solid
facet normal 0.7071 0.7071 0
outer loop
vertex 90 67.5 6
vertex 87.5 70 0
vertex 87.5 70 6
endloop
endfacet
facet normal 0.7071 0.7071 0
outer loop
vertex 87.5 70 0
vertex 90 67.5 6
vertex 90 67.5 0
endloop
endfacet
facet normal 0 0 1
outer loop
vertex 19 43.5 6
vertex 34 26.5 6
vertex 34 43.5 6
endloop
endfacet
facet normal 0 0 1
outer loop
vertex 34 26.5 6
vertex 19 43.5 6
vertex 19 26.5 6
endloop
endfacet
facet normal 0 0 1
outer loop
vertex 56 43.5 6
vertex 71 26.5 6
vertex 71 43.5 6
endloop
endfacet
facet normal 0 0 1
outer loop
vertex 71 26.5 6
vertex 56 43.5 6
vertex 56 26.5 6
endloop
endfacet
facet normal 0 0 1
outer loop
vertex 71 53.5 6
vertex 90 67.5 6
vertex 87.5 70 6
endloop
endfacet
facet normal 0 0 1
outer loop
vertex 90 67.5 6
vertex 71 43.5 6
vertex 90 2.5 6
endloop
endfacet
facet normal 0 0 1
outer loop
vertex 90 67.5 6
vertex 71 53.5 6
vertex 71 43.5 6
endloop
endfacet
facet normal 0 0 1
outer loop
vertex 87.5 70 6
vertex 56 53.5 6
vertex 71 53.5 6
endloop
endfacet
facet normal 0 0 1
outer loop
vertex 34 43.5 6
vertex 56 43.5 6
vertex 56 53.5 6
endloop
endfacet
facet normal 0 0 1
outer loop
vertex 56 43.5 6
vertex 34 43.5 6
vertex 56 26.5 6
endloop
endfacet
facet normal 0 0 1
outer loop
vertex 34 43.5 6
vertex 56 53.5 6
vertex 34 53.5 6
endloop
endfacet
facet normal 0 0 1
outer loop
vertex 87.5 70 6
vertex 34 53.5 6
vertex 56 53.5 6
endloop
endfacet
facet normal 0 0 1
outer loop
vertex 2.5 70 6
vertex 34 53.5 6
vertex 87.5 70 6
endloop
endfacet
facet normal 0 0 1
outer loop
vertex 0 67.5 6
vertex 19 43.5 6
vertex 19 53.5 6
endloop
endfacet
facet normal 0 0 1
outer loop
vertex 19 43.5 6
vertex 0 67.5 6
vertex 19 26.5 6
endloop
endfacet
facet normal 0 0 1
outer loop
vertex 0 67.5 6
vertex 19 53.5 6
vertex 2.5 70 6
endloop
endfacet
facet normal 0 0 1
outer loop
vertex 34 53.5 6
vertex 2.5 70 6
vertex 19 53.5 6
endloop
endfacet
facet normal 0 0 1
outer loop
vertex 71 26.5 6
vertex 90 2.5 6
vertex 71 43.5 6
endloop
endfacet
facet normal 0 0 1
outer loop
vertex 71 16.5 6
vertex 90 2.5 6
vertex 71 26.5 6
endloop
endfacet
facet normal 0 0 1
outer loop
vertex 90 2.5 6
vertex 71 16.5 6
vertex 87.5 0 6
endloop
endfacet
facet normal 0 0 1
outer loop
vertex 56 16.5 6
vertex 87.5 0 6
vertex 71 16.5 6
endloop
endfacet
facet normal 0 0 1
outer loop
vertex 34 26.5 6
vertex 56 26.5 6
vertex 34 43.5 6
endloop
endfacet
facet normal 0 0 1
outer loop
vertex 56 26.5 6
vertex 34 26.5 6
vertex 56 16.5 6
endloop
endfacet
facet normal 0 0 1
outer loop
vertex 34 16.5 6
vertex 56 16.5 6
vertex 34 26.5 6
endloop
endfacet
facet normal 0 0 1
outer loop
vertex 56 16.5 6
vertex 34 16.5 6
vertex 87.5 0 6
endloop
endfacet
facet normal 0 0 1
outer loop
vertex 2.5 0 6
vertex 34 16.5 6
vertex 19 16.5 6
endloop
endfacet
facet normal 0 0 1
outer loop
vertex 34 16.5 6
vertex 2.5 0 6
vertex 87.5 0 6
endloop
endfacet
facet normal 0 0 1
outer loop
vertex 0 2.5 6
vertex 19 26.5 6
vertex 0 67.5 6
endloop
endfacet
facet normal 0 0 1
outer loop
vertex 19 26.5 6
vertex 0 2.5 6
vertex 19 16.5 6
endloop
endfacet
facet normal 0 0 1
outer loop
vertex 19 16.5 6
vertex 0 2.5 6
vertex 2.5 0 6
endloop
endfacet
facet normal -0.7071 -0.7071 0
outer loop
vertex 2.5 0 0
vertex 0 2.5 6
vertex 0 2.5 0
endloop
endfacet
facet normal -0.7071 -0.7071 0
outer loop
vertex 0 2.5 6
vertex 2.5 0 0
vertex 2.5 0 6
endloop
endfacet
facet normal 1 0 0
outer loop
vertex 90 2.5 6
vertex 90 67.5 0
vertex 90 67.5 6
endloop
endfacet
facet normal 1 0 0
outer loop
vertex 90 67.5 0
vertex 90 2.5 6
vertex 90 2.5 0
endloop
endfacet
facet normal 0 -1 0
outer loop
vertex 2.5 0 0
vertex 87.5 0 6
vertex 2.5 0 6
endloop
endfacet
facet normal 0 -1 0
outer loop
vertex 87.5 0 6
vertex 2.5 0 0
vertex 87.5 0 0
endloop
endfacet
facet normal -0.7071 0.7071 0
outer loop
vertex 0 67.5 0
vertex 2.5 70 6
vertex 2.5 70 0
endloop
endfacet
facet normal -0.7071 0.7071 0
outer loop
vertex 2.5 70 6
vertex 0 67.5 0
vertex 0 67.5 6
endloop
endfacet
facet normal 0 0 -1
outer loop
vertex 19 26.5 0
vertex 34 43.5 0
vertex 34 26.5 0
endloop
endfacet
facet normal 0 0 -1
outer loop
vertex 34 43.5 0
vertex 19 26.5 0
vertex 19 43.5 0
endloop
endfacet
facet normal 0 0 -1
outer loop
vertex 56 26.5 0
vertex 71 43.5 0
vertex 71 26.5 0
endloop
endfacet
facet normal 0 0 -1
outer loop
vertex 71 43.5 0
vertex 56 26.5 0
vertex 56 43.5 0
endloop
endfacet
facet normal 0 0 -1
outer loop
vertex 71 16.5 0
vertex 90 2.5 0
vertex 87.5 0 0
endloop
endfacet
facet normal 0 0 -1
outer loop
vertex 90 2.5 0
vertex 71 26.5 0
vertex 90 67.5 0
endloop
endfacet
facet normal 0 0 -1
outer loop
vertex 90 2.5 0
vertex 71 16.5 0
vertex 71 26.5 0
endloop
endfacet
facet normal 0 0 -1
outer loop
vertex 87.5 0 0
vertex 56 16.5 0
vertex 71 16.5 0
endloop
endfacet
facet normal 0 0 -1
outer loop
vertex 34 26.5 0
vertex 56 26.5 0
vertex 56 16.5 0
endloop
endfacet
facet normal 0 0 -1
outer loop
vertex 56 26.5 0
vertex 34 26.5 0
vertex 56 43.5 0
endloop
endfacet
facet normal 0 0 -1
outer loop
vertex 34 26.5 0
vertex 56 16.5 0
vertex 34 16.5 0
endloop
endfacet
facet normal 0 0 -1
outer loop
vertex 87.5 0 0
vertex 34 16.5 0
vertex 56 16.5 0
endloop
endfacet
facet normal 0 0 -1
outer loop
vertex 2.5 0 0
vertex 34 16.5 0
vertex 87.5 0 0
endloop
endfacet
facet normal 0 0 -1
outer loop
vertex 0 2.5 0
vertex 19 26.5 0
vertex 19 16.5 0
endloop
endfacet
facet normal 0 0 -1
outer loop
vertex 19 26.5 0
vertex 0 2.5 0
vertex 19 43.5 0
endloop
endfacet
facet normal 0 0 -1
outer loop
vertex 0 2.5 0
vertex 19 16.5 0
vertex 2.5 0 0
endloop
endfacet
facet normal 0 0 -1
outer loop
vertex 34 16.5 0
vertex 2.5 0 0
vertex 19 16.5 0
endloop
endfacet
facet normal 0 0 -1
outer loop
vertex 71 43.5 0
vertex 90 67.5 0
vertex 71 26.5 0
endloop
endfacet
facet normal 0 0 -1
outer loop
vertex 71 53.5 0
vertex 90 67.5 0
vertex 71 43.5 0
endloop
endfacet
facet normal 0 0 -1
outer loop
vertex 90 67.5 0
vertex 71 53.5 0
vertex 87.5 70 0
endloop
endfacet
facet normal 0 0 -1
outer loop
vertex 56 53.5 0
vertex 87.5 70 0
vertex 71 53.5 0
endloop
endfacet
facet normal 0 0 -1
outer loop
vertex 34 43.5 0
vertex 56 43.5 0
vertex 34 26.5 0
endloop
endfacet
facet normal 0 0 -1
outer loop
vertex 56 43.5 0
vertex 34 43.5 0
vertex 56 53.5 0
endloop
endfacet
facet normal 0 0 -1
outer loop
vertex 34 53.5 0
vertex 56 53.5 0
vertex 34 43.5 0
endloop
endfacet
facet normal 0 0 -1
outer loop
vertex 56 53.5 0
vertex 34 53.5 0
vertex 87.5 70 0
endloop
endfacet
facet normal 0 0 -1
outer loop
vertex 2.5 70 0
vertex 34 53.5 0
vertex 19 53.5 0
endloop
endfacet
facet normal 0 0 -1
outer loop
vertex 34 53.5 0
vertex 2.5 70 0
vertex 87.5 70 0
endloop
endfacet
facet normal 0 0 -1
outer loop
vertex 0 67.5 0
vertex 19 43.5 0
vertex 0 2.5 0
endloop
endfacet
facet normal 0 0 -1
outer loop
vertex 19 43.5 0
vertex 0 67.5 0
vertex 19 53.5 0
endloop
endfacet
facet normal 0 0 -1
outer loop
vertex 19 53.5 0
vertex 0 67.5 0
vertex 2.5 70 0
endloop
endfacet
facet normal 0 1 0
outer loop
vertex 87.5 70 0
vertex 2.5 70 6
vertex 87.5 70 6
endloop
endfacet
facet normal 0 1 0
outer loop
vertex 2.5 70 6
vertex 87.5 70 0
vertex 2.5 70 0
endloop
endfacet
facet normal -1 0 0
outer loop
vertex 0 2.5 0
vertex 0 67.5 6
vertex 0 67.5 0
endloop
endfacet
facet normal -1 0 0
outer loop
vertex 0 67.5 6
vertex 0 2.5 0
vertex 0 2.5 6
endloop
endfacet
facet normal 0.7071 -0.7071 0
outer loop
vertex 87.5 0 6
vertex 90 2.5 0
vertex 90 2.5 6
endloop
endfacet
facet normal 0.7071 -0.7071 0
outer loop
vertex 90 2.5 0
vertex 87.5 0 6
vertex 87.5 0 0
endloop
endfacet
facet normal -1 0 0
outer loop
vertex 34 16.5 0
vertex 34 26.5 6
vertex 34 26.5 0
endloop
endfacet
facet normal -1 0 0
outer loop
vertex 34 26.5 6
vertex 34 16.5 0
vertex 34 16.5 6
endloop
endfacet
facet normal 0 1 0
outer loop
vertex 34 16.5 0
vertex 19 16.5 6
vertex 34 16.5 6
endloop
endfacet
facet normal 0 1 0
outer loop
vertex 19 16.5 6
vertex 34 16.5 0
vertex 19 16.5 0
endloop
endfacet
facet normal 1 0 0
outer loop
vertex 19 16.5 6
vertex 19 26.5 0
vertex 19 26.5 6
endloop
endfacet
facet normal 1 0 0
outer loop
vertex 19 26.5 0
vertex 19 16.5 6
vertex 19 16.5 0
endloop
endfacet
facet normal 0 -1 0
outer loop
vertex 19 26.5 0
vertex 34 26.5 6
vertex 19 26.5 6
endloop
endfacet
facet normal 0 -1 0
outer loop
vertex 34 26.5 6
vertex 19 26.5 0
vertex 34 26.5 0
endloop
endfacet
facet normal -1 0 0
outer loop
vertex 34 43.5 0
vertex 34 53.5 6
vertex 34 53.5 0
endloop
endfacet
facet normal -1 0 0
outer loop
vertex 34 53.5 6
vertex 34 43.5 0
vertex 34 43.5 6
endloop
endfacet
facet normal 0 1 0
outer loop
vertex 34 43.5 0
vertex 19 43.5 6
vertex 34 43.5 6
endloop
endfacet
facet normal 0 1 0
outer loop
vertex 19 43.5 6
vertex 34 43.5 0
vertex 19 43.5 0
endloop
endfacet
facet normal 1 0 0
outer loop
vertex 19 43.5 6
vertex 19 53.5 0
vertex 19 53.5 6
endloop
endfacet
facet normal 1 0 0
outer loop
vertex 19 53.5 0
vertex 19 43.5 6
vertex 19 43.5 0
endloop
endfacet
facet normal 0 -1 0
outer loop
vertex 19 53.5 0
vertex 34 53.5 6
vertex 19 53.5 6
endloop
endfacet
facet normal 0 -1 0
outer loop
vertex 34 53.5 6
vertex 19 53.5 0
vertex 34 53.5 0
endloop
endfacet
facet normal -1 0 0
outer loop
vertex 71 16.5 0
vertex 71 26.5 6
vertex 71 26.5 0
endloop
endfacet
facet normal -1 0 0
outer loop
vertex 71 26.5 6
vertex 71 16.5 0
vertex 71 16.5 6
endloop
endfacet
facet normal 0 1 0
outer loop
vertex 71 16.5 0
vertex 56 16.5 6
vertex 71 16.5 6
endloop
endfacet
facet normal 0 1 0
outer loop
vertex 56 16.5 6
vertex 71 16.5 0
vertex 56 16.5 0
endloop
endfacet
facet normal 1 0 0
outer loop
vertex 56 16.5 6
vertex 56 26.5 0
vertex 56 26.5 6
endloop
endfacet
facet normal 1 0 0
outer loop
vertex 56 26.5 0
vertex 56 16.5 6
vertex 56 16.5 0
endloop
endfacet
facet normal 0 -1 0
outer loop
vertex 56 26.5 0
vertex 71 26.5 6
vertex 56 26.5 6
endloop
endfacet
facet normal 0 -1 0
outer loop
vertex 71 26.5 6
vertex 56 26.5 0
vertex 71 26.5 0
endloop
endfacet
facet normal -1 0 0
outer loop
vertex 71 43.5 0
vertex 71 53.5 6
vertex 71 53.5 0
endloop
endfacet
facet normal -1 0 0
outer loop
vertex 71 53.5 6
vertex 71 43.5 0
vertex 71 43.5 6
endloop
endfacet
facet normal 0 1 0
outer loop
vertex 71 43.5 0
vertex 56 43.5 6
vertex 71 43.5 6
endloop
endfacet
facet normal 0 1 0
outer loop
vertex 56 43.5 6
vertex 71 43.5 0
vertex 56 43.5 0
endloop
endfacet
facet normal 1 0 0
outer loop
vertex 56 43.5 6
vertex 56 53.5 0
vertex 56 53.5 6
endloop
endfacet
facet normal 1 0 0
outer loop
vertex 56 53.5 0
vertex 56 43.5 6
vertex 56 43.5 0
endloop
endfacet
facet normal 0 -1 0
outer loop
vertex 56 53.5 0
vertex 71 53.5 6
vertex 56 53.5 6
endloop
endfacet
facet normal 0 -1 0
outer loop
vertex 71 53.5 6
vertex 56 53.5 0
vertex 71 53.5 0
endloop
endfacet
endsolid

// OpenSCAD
$fn = 32;

// ----------------------------------------------------------------------
// Windowed plate: 4 voids, 90 x 70 x 6 mm
// ----------------------------------------------------------------------

// --- parameters (mm) ---
plate_l = 90;             // plate length, X
plate_w = 70;             // plate width, Y
plate_t = 6;              // plate thickness, Z
edge_margin = 8;          // wall from the plate edge to any window
win_l = 15;               // pocket length
win_w = 10;               // pocket width
pitch_x = 37;             // grid pitch along X
pitch_y = 27;             // grid pitch along Y
depth_1 = 6;              // depth of void 1 (full thickness = through)
depth_2 = 6;              // depth of void 2 (full thickness = through)
depth_3 = 6;              // depth of void 3 (full thickness = through)
depth_4 = 6;              // depth of void 4 (full thickness = through)
corner_c = 2.5;           // corner chamfer of the plate

profile = [[2.5, 0], [87.5, 0], [90, 2.5], [90, 67.5], [87.5, 70], [2.5, 70], [0, 67.5], [0, 2.5]];  // primary outline, 8 points, counter clockwise
void_1 = [[19, 16.5], [34, 16.5], [34, 26.5], [19, 26.5]];  // pocket at grid node 0,0, 4 points
void_2 = [[19, 43.5], [34, 43.5], [34, 53.5], [19, 53.5]];  // pocket at grid node 0,1, 4 points
void_3 = [[56, 16.5], [71, 16.5], [71, 26.5], [56, 26.5]];  // pocket at grid node 1,0, 4 points
void_4 = [[56, 43.5], [71, 43.5], [71, 53.5], [56, 53.5]];  // pocket at grid node 1,1, 4 points

// --- the one profile operation ---
difference() {
  linear_extrude(height = plate_t) polygon(points = profile);
  translate([0, 0, -1])
    linear_extrude(height = plate_t + 2) polygon(points = void_1);
  translate([0, 0, -1])
    linear_extrude(height = plate_t + 2) polygon(points = void_2);
  translate([0, 0, -1])
    linear_extrude(height = plate_t + 2) polygon(points = void_3);
  translate([0, 0, -1])
    linear_extrude(height = plate_t + 2) polygon(points = void_4);
}
